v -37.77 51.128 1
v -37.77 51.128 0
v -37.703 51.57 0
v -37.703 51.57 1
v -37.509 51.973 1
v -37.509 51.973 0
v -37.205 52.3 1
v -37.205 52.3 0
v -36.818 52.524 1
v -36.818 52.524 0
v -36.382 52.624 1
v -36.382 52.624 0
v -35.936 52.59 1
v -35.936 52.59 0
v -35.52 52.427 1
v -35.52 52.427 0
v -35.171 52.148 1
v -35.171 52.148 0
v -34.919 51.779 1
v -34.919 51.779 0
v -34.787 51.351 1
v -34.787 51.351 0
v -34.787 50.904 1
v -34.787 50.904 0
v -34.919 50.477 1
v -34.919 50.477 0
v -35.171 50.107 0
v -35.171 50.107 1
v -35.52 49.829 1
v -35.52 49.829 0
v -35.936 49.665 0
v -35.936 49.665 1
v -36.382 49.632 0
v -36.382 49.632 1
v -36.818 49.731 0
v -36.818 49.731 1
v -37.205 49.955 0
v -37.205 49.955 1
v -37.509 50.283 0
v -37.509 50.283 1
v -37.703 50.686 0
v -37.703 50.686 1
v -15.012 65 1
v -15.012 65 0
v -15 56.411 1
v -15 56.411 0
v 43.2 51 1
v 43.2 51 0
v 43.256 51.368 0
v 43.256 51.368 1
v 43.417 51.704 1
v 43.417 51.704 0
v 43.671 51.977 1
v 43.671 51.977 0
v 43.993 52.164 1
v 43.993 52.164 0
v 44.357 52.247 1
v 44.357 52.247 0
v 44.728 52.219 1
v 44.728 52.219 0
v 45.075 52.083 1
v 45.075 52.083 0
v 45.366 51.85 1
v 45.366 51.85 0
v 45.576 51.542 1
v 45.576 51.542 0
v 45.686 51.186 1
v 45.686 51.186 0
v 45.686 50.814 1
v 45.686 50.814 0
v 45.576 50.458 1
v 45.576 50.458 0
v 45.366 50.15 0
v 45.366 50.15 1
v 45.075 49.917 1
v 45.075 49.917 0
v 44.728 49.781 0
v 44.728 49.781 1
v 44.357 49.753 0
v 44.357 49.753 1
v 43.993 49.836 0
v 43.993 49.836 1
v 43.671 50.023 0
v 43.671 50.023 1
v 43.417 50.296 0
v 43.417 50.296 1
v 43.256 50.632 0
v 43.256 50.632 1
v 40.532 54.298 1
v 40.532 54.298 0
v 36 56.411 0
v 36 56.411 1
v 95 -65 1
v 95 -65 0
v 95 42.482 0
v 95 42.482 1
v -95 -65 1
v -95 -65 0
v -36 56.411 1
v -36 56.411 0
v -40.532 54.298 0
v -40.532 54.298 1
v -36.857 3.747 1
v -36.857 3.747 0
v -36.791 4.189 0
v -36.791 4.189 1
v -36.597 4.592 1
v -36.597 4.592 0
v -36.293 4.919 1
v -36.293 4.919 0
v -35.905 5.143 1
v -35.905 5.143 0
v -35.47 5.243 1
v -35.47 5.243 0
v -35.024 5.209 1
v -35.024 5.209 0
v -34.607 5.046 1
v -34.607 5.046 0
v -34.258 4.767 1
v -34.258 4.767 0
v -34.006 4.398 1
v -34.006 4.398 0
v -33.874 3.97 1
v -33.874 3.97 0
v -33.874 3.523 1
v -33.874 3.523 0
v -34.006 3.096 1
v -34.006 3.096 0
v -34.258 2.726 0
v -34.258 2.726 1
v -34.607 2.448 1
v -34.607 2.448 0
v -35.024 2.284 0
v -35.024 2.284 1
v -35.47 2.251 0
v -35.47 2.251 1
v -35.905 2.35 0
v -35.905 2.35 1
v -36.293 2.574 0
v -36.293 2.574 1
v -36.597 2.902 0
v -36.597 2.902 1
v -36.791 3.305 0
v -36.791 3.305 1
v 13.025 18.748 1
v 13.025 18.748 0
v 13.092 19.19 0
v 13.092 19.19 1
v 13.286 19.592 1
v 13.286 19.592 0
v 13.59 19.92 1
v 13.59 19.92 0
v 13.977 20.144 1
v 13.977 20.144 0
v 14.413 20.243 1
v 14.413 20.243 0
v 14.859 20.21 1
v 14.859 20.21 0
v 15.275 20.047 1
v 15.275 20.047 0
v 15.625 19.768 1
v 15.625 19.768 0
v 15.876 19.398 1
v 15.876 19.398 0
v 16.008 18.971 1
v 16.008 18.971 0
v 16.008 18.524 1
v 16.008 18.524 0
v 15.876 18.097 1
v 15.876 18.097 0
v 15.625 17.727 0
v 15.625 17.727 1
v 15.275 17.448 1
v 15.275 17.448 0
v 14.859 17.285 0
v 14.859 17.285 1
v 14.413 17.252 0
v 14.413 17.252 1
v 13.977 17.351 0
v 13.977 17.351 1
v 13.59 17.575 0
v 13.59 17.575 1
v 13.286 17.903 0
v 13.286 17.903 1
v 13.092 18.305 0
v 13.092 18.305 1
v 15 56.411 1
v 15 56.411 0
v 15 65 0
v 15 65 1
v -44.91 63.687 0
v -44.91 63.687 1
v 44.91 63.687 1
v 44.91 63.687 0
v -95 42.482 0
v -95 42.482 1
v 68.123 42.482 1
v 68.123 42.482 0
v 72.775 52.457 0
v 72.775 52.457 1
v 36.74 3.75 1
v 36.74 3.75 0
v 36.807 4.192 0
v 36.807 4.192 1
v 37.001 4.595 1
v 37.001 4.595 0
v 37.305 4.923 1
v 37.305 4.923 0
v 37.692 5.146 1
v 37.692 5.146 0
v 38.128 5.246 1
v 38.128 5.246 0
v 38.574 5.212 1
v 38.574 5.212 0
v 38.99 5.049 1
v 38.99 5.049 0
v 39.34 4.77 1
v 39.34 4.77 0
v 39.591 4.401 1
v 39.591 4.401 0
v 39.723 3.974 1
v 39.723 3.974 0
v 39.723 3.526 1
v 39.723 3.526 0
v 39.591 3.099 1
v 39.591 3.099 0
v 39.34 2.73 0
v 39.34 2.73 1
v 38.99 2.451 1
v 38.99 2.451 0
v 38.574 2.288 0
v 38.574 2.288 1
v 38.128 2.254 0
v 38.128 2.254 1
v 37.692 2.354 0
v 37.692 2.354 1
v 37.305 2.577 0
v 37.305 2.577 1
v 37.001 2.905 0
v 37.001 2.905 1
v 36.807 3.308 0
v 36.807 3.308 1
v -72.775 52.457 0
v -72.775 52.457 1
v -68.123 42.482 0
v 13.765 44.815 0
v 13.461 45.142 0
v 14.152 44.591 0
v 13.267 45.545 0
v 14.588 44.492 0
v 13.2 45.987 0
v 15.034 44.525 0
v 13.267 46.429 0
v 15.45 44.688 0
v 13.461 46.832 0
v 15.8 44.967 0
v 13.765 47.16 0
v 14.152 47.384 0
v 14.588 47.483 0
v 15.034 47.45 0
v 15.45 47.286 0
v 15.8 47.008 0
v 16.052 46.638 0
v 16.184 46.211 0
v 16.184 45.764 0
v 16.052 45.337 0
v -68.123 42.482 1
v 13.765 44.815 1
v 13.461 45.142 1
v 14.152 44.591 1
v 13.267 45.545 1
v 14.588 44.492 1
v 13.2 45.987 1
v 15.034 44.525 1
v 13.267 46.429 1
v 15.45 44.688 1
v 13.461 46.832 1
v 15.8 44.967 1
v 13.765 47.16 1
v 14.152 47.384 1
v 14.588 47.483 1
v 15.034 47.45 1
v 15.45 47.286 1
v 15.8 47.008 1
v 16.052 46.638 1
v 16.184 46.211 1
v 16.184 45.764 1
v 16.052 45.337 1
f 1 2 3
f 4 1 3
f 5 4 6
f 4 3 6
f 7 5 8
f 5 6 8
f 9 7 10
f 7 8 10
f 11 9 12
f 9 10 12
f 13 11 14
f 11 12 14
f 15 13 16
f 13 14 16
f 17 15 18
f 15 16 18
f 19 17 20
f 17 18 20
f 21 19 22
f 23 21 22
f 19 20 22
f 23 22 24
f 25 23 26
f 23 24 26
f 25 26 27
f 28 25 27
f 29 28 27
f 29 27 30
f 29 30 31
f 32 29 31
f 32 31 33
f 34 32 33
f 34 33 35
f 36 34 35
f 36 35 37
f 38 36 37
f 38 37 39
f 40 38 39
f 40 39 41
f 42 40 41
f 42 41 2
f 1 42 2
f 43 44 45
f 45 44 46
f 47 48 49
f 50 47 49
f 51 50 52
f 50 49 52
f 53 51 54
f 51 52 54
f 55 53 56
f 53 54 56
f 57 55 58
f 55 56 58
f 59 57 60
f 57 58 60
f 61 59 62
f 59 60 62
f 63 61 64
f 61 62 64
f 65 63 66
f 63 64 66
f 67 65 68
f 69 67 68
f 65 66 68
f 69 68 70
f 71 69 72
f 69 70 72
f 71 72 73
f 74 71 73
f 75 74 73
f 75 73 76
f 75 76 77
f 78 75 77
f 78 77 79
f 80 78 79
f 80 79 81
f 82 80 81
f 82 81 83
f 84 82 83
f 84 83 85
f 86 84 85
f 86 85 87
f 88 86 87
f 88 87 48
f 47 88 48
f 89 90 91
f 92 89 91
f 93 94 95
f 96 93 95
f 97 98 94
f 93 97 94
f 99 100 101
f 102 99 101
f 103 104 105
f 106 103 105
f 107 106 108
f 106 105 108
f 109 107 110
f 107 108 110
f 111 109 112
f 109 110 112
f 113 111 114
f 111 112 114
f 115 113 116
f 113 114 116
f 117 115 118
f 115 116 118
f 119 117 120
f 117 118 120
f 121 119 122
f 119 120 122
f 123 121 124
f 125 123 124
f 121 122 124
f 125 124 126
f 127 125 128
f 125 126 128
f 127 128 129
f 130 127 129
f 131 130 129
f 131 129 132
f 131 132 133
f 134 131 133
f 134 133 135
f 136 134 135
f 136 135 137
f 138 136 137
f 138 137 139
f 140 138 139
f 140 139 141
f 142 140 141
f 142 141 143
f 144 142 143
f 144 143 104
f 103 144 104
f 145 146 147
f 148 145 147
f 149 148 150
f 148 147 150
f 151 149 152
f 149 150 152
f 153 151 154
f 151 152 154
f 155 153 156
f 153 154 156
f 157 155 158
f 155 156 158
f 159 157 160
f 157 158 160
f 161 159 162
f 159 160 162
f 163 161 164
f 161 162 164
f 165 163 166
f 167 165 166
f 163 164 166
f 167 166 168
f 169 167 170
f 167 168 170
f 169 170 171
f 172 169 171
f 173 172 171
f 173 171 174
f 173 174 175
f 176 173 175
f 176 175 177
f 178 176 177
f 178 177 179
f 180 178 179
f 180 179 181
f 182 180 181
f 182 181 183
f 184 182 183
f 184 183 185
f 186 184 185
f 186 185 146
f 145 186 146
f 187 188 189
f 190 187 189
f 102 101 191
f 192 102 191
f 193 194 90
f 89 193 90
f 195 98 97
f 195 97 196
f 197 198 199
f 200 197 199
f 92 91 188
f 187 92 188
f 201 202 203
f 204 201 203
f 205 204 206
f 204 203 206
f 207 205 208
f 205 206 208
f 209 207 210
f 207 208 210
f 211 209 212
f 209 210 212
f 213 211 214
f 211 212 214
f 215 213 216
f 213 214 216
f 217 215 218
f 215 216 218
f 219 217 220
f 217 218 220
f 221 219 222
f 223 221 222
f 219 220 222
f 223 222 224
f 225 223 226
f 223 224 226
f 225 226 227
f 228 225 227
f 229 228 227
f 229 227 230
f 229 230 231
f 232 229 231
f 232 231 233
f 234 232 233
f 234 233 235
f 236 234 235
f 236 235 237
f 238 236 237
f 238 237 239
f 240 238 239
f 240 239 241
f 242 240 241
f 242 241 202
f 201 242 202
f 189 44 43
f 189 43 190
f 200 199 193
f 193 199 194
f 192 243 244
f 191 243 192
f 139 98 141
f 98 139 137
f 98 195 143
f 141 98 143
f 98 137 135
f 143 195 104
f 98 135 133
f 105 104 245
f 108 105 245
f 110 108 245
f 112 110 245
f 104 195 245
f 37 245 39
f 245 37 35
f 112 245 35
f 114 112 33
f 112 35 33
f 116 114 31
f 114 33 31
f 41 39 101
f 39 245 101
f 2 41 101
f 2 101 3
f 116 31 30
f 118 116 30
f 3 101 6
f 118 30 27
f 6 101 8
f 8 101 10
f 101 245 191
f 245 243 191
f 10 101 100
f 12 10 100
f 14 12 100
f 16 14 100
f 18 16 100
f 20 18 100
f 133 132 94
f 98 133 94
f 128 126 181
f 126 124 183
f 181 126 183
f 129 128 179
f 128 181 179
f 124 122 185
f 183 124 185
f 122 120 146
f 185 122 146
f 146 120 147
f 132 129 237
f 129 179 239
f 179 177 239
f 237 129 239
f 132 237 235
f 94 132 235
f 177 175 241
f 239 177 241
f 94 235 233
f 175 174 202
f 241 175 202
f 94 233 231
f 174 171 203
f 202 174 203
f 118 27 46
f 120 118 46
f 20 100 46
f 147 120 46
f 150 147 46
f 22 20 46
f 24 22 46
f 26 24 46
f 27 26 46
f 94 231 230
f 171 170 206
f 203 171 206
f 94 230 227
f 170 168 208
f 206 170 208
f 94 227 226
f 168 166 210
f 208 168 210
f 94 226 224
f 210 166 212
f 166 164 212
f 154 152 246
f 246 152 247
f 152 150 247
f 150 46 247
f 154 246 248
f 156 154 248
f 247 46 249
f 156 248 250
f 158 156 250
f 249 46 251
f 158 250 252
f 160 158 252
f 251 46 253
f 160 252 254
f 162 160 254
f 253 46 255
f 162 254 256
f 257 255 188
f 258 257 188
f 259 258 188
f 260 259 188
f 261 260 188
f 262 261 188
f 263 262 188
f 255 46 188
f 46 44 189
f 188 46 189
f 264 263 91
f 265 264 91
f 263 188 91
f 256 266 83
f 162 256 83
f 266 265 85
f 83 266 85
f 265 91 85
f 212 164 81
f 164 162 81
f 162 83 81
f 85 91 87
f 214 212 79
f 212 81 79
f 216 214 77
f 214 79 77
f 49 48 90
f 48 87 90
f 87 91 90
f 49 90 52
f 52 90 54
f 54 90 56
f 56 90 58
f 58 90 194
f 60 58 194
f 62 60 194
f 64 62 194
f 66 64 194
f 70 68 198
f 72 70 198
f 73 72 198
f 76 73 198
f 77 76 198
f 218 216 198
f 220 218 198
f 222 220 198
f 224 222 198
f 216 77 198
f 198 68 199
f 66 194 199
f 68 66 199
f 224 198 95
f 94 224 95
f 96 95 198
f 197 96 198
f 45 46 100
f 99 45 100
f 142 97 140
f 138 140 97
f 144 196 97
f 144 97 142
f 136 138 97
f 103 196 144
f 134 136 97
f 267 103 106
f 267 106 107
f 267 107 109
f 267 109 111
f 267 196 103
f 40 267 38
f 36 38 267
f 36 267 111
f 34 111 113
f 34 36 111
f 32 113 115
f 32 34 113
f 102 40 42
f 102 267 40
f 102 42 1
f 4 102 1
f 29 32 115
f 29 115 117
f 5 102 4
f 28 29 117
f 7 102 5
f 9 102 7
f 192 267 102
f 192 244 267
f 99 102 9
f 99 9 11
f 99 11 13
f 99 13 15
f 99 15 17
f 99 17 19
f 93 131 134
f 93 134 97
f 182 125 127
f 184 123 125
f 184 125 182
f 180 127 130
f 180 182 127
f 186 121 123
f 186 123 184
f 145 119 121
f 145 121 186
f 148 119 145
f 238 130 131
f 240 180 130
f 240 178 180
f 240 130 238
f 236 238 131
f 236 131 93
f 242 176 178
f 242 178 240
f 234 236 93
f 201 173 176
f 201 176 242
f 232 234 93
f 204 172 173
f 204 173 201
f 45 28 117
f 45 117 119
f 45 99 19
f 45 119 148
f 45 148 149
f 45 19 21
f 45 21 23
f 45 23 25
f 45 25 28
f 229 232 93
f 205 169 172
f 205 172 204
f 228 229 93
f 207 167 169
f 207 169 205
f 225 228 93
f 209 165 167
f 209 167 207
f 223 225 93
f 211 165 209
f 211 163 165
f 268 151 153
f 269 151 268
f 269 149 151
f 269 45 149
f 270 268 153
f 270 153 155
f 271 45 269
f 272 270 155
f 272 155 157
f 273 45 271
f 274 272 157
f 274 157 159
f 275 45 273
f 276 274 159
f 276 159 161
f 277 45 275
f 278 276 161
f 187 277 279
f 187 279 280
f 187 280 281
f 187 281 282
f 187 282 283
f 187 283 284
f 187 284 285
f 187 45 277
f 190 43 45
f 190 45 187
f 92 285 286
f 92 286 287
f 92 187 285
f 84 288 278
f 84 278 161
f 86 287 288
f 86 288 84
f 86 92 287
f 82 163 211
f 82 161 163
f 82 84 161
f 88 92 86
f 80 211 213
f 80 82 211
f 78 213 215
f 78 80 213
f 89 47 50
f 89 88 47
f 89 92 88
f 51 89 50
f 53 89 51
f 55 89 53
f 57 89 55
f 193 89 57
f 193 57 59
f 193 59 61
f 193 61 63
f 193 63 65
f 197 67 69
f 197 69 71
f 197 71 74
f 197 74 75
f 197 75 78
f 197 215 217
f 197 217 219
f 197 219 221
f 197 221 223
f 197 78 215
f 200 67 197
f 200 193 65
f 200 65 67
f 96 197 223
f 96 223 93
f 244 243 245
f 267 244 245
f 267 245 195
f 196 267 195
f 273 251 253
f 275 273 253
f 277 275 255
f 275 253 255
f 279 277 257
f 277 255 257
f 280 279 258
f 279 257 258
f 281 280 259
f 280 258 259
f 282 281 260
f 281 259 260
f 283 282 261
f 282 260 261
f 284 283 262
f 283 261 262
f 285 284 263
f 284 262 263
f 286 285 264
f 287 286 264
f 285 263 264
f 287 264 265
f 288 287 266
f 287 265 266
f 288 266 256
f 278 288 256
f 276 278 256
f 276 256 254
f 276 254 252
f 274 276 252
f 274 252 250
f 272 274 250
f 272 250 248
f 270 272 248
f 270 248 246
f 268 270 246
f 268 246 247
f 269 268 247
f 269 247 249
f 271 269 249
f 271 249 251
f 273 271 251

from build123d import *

# Parameters (mm, degrees)
CROQUIS1_W              = 190
CROQUIS1_H              = 130
SALIENTE_EXTRUIR1_DEPTH = 1
CROQUIS9_R              = 1.25
CROQUIS9_R_2            = 1.5
CORTAR_EXTRUIR2_DEPTH   = 10
CORTAR_EXTRUIR3_REACH   = 3
CORTAR_EXTRUIR4_REACH   = 3


with BuildPart() as part:
    # Croquis1 → Saliente-Extruir1 (new body)
    with BuildSketch(Plane.XY):
        Rectangle(CROQUIS1_W, CROQUIS1_H)
    extrude(amount=SALIENTE_EXTRUIR1_DEPTH)

    # Croquis9 → Cortar-Extruir2 (cut)
    with BuildSketch(Plane(origin=(0, 0, 0), x_dir=(-1, 0, 0), z_dir=(0, 0, -1))):
        with Locations((-44.45, 51)):
            Circle(CROQUIS9_R)
        with Locations((35.357472454, 3.746718702)):
            Circle(CROQUIS9_R_2)
        with Locations((36.270123649, 51.127714796)):
            Circle(CROQUIS9_R_2)
        with Locations((-14.524931807, 18.747519864)):
            Circle(CROQUIS9_R_2)
        with Locations((-14.700351259, 45.987329572)):
            Circle(CROQUIS9_R_2)
        with Locations((-38.24, 3.75)):
            Circle(CROQUIS9_R_2)
    extrude(amount=-CORTAR_EXTRUIR2_DEPTH, mode=Mode.SUBTRACT)

    # Croquis12 → Cortar-Extruir3 (cut, up to next)
    with BuildSketch(Plane(origin=(0, 0, 0), x_dir=(-1, 0, 0), z_dir=(0, 0, -1)), mode=Mode.PRIVATE) as cortar_extruir3_sk1:
        Polygon((-95, 65), (-95, 43.5), (-41.651647359, 65), align=None)
    cortar_extruir3_tool1 = extrude(cortar_extruir3_sk1.sketch, amount=-CORTAR_EXTRUIR3_REACH, mode=Mode.PRIVATE) & part.part
    add(cortar_extruir3_tool1.solids().sort_by_distance((77.217216, 57.833333, 0))[0], mode=Mode.SUBTRACT)
    # Croquis12 → Cortar-Extruir3 (cut, up to next)
    with BuildSketch(Plane(origin=(0, 0, 0), x_dir=(-1, 0, 0), z_dir=(0, 0, -1)), mode=Mode.PRIVATE) as cortar_extruir3_sk2:
        Polygon((41.651647359, 65), (95, 65), (95, 43.5), align=None)
    cortar_extruir3_tool2 = extrude(cortar_extruir3_sk2.sketch, amount=-CORTAR_EXTRUIR3_REACH, mode=Mode.PRIVATE) & part.part
    add(cortar_extruir3_tool2.solids().sort_by_distance((-77.217216, 57.833333, 0))[0], mode=Mode.SUBTRACT)

    # Croquis13 → Cortar-Extruir4 (cut, up to next)
    with BuildSketch(Plane(origin=(0, 0, 0), x_dir=(-1, 0, 0), z_dir=(0, 0, -1)), mode=Mode.PRIVATE) as cortar_extruir4_sk1:
        Polygon((-68.123188454, 42.482226287), (-72.77455345, 52.45711071), (-95, 43.5), (-95.030741331, 42.482226287), align=None)
    cortar_extruir4_tool1 = extrude(cortar_extruir4_sk1.sketch, amount=-CORTAR_EXTRUIR4_REACH, mode=Mode.PRIVATE) & part.part
    add(cortar_extruir4_tool1.solids().sort_by_distance((79.331365, 45.833261, 0))[0], mode=Mode.SUBTRACT)
    # Croquis13 → Cortar-Extruir4 (cut, up to next)
    with BuildSketch(Plane(origin=(0, 0, 0), x_dir=(-1, 0, 0), z_dir=(0, 0, -1)), mode=Mode.PRIVATE) as cortar_extruir4_sk2:
        Polygon((-44.909770717, 63.686938795), (-40.531538935, 54.297790439), (-36, 56.410881748), (-15, 56.410881748), (-15, 65), (-41.651647359, 65), align=None)
    cortar_extruir4_tool2 = extrude(cortar_extruir4_sk2.sketch, amount=-CORTAR_EXTRUIR4_REACH, mode=Mode.PRIVATE) & part.part
    add(cortar_extruir4_tool2.solids().sort_by_distance((29.368606, 60.647773, 0))[0], mode=Mode.SUBTRACT)
    # Croquis13 → Cortar-Extruir4 (cut, up to next)
    with BuildSketch(Plane(origin=(0, 0, 0), x_dir=(-1, 0, 0), z_dir=(0, 0, -1)), mode=Mode.PRIVATE) as cortar_extruir4_sk3:
        Polygon((44.909770717, 63.686938795), (41.651647359, 65), (15.011500088, 65), (15, 56.410881748), (36, 56.410881748), (40.531538935, 54.297790439), align=None)
    cortar_extruir4_tool3 = extrude(cortar_extruir4_sk3.sketch, amount=-CORTAR_EXTRUIR4_REACH, mode=Mode.PRIVATE) & part.part
    add(cortar_extruir4_tool3.solids().sort_by_distance((-29.371465, 60.647477, 0))[0], mode=Mode.SUBTRACT)
    # Croquis13 → Cortar-Extruir4 (cut, up to next)
    with BuildSketch(Plane(origin=(0, 0, 0), x_dir=(-1, 0, 0), z_dir=(0, 0, -1)), mode=Mode.PRIVATE) as cortar_extruir4_sk4:
        Polygon((72.77455345, 52.45711071), (68.123188454, 42.482226287), (95, 42.482226287), (95, 43.5), align=None)
    cortar_extruir4_tool4 = extrude(cortar_extruir4_sk4.sketch, amount=-CORTAR_EXTRUIR4_REACH, mode=Mode.PRIVATE) & part.part
    add(cortar_extruir4_tool4.solids().sort_by_distance((-79.329677, 45.833585, 0))[0], mode=Mode.SUBTRACT)


solid = part.part
